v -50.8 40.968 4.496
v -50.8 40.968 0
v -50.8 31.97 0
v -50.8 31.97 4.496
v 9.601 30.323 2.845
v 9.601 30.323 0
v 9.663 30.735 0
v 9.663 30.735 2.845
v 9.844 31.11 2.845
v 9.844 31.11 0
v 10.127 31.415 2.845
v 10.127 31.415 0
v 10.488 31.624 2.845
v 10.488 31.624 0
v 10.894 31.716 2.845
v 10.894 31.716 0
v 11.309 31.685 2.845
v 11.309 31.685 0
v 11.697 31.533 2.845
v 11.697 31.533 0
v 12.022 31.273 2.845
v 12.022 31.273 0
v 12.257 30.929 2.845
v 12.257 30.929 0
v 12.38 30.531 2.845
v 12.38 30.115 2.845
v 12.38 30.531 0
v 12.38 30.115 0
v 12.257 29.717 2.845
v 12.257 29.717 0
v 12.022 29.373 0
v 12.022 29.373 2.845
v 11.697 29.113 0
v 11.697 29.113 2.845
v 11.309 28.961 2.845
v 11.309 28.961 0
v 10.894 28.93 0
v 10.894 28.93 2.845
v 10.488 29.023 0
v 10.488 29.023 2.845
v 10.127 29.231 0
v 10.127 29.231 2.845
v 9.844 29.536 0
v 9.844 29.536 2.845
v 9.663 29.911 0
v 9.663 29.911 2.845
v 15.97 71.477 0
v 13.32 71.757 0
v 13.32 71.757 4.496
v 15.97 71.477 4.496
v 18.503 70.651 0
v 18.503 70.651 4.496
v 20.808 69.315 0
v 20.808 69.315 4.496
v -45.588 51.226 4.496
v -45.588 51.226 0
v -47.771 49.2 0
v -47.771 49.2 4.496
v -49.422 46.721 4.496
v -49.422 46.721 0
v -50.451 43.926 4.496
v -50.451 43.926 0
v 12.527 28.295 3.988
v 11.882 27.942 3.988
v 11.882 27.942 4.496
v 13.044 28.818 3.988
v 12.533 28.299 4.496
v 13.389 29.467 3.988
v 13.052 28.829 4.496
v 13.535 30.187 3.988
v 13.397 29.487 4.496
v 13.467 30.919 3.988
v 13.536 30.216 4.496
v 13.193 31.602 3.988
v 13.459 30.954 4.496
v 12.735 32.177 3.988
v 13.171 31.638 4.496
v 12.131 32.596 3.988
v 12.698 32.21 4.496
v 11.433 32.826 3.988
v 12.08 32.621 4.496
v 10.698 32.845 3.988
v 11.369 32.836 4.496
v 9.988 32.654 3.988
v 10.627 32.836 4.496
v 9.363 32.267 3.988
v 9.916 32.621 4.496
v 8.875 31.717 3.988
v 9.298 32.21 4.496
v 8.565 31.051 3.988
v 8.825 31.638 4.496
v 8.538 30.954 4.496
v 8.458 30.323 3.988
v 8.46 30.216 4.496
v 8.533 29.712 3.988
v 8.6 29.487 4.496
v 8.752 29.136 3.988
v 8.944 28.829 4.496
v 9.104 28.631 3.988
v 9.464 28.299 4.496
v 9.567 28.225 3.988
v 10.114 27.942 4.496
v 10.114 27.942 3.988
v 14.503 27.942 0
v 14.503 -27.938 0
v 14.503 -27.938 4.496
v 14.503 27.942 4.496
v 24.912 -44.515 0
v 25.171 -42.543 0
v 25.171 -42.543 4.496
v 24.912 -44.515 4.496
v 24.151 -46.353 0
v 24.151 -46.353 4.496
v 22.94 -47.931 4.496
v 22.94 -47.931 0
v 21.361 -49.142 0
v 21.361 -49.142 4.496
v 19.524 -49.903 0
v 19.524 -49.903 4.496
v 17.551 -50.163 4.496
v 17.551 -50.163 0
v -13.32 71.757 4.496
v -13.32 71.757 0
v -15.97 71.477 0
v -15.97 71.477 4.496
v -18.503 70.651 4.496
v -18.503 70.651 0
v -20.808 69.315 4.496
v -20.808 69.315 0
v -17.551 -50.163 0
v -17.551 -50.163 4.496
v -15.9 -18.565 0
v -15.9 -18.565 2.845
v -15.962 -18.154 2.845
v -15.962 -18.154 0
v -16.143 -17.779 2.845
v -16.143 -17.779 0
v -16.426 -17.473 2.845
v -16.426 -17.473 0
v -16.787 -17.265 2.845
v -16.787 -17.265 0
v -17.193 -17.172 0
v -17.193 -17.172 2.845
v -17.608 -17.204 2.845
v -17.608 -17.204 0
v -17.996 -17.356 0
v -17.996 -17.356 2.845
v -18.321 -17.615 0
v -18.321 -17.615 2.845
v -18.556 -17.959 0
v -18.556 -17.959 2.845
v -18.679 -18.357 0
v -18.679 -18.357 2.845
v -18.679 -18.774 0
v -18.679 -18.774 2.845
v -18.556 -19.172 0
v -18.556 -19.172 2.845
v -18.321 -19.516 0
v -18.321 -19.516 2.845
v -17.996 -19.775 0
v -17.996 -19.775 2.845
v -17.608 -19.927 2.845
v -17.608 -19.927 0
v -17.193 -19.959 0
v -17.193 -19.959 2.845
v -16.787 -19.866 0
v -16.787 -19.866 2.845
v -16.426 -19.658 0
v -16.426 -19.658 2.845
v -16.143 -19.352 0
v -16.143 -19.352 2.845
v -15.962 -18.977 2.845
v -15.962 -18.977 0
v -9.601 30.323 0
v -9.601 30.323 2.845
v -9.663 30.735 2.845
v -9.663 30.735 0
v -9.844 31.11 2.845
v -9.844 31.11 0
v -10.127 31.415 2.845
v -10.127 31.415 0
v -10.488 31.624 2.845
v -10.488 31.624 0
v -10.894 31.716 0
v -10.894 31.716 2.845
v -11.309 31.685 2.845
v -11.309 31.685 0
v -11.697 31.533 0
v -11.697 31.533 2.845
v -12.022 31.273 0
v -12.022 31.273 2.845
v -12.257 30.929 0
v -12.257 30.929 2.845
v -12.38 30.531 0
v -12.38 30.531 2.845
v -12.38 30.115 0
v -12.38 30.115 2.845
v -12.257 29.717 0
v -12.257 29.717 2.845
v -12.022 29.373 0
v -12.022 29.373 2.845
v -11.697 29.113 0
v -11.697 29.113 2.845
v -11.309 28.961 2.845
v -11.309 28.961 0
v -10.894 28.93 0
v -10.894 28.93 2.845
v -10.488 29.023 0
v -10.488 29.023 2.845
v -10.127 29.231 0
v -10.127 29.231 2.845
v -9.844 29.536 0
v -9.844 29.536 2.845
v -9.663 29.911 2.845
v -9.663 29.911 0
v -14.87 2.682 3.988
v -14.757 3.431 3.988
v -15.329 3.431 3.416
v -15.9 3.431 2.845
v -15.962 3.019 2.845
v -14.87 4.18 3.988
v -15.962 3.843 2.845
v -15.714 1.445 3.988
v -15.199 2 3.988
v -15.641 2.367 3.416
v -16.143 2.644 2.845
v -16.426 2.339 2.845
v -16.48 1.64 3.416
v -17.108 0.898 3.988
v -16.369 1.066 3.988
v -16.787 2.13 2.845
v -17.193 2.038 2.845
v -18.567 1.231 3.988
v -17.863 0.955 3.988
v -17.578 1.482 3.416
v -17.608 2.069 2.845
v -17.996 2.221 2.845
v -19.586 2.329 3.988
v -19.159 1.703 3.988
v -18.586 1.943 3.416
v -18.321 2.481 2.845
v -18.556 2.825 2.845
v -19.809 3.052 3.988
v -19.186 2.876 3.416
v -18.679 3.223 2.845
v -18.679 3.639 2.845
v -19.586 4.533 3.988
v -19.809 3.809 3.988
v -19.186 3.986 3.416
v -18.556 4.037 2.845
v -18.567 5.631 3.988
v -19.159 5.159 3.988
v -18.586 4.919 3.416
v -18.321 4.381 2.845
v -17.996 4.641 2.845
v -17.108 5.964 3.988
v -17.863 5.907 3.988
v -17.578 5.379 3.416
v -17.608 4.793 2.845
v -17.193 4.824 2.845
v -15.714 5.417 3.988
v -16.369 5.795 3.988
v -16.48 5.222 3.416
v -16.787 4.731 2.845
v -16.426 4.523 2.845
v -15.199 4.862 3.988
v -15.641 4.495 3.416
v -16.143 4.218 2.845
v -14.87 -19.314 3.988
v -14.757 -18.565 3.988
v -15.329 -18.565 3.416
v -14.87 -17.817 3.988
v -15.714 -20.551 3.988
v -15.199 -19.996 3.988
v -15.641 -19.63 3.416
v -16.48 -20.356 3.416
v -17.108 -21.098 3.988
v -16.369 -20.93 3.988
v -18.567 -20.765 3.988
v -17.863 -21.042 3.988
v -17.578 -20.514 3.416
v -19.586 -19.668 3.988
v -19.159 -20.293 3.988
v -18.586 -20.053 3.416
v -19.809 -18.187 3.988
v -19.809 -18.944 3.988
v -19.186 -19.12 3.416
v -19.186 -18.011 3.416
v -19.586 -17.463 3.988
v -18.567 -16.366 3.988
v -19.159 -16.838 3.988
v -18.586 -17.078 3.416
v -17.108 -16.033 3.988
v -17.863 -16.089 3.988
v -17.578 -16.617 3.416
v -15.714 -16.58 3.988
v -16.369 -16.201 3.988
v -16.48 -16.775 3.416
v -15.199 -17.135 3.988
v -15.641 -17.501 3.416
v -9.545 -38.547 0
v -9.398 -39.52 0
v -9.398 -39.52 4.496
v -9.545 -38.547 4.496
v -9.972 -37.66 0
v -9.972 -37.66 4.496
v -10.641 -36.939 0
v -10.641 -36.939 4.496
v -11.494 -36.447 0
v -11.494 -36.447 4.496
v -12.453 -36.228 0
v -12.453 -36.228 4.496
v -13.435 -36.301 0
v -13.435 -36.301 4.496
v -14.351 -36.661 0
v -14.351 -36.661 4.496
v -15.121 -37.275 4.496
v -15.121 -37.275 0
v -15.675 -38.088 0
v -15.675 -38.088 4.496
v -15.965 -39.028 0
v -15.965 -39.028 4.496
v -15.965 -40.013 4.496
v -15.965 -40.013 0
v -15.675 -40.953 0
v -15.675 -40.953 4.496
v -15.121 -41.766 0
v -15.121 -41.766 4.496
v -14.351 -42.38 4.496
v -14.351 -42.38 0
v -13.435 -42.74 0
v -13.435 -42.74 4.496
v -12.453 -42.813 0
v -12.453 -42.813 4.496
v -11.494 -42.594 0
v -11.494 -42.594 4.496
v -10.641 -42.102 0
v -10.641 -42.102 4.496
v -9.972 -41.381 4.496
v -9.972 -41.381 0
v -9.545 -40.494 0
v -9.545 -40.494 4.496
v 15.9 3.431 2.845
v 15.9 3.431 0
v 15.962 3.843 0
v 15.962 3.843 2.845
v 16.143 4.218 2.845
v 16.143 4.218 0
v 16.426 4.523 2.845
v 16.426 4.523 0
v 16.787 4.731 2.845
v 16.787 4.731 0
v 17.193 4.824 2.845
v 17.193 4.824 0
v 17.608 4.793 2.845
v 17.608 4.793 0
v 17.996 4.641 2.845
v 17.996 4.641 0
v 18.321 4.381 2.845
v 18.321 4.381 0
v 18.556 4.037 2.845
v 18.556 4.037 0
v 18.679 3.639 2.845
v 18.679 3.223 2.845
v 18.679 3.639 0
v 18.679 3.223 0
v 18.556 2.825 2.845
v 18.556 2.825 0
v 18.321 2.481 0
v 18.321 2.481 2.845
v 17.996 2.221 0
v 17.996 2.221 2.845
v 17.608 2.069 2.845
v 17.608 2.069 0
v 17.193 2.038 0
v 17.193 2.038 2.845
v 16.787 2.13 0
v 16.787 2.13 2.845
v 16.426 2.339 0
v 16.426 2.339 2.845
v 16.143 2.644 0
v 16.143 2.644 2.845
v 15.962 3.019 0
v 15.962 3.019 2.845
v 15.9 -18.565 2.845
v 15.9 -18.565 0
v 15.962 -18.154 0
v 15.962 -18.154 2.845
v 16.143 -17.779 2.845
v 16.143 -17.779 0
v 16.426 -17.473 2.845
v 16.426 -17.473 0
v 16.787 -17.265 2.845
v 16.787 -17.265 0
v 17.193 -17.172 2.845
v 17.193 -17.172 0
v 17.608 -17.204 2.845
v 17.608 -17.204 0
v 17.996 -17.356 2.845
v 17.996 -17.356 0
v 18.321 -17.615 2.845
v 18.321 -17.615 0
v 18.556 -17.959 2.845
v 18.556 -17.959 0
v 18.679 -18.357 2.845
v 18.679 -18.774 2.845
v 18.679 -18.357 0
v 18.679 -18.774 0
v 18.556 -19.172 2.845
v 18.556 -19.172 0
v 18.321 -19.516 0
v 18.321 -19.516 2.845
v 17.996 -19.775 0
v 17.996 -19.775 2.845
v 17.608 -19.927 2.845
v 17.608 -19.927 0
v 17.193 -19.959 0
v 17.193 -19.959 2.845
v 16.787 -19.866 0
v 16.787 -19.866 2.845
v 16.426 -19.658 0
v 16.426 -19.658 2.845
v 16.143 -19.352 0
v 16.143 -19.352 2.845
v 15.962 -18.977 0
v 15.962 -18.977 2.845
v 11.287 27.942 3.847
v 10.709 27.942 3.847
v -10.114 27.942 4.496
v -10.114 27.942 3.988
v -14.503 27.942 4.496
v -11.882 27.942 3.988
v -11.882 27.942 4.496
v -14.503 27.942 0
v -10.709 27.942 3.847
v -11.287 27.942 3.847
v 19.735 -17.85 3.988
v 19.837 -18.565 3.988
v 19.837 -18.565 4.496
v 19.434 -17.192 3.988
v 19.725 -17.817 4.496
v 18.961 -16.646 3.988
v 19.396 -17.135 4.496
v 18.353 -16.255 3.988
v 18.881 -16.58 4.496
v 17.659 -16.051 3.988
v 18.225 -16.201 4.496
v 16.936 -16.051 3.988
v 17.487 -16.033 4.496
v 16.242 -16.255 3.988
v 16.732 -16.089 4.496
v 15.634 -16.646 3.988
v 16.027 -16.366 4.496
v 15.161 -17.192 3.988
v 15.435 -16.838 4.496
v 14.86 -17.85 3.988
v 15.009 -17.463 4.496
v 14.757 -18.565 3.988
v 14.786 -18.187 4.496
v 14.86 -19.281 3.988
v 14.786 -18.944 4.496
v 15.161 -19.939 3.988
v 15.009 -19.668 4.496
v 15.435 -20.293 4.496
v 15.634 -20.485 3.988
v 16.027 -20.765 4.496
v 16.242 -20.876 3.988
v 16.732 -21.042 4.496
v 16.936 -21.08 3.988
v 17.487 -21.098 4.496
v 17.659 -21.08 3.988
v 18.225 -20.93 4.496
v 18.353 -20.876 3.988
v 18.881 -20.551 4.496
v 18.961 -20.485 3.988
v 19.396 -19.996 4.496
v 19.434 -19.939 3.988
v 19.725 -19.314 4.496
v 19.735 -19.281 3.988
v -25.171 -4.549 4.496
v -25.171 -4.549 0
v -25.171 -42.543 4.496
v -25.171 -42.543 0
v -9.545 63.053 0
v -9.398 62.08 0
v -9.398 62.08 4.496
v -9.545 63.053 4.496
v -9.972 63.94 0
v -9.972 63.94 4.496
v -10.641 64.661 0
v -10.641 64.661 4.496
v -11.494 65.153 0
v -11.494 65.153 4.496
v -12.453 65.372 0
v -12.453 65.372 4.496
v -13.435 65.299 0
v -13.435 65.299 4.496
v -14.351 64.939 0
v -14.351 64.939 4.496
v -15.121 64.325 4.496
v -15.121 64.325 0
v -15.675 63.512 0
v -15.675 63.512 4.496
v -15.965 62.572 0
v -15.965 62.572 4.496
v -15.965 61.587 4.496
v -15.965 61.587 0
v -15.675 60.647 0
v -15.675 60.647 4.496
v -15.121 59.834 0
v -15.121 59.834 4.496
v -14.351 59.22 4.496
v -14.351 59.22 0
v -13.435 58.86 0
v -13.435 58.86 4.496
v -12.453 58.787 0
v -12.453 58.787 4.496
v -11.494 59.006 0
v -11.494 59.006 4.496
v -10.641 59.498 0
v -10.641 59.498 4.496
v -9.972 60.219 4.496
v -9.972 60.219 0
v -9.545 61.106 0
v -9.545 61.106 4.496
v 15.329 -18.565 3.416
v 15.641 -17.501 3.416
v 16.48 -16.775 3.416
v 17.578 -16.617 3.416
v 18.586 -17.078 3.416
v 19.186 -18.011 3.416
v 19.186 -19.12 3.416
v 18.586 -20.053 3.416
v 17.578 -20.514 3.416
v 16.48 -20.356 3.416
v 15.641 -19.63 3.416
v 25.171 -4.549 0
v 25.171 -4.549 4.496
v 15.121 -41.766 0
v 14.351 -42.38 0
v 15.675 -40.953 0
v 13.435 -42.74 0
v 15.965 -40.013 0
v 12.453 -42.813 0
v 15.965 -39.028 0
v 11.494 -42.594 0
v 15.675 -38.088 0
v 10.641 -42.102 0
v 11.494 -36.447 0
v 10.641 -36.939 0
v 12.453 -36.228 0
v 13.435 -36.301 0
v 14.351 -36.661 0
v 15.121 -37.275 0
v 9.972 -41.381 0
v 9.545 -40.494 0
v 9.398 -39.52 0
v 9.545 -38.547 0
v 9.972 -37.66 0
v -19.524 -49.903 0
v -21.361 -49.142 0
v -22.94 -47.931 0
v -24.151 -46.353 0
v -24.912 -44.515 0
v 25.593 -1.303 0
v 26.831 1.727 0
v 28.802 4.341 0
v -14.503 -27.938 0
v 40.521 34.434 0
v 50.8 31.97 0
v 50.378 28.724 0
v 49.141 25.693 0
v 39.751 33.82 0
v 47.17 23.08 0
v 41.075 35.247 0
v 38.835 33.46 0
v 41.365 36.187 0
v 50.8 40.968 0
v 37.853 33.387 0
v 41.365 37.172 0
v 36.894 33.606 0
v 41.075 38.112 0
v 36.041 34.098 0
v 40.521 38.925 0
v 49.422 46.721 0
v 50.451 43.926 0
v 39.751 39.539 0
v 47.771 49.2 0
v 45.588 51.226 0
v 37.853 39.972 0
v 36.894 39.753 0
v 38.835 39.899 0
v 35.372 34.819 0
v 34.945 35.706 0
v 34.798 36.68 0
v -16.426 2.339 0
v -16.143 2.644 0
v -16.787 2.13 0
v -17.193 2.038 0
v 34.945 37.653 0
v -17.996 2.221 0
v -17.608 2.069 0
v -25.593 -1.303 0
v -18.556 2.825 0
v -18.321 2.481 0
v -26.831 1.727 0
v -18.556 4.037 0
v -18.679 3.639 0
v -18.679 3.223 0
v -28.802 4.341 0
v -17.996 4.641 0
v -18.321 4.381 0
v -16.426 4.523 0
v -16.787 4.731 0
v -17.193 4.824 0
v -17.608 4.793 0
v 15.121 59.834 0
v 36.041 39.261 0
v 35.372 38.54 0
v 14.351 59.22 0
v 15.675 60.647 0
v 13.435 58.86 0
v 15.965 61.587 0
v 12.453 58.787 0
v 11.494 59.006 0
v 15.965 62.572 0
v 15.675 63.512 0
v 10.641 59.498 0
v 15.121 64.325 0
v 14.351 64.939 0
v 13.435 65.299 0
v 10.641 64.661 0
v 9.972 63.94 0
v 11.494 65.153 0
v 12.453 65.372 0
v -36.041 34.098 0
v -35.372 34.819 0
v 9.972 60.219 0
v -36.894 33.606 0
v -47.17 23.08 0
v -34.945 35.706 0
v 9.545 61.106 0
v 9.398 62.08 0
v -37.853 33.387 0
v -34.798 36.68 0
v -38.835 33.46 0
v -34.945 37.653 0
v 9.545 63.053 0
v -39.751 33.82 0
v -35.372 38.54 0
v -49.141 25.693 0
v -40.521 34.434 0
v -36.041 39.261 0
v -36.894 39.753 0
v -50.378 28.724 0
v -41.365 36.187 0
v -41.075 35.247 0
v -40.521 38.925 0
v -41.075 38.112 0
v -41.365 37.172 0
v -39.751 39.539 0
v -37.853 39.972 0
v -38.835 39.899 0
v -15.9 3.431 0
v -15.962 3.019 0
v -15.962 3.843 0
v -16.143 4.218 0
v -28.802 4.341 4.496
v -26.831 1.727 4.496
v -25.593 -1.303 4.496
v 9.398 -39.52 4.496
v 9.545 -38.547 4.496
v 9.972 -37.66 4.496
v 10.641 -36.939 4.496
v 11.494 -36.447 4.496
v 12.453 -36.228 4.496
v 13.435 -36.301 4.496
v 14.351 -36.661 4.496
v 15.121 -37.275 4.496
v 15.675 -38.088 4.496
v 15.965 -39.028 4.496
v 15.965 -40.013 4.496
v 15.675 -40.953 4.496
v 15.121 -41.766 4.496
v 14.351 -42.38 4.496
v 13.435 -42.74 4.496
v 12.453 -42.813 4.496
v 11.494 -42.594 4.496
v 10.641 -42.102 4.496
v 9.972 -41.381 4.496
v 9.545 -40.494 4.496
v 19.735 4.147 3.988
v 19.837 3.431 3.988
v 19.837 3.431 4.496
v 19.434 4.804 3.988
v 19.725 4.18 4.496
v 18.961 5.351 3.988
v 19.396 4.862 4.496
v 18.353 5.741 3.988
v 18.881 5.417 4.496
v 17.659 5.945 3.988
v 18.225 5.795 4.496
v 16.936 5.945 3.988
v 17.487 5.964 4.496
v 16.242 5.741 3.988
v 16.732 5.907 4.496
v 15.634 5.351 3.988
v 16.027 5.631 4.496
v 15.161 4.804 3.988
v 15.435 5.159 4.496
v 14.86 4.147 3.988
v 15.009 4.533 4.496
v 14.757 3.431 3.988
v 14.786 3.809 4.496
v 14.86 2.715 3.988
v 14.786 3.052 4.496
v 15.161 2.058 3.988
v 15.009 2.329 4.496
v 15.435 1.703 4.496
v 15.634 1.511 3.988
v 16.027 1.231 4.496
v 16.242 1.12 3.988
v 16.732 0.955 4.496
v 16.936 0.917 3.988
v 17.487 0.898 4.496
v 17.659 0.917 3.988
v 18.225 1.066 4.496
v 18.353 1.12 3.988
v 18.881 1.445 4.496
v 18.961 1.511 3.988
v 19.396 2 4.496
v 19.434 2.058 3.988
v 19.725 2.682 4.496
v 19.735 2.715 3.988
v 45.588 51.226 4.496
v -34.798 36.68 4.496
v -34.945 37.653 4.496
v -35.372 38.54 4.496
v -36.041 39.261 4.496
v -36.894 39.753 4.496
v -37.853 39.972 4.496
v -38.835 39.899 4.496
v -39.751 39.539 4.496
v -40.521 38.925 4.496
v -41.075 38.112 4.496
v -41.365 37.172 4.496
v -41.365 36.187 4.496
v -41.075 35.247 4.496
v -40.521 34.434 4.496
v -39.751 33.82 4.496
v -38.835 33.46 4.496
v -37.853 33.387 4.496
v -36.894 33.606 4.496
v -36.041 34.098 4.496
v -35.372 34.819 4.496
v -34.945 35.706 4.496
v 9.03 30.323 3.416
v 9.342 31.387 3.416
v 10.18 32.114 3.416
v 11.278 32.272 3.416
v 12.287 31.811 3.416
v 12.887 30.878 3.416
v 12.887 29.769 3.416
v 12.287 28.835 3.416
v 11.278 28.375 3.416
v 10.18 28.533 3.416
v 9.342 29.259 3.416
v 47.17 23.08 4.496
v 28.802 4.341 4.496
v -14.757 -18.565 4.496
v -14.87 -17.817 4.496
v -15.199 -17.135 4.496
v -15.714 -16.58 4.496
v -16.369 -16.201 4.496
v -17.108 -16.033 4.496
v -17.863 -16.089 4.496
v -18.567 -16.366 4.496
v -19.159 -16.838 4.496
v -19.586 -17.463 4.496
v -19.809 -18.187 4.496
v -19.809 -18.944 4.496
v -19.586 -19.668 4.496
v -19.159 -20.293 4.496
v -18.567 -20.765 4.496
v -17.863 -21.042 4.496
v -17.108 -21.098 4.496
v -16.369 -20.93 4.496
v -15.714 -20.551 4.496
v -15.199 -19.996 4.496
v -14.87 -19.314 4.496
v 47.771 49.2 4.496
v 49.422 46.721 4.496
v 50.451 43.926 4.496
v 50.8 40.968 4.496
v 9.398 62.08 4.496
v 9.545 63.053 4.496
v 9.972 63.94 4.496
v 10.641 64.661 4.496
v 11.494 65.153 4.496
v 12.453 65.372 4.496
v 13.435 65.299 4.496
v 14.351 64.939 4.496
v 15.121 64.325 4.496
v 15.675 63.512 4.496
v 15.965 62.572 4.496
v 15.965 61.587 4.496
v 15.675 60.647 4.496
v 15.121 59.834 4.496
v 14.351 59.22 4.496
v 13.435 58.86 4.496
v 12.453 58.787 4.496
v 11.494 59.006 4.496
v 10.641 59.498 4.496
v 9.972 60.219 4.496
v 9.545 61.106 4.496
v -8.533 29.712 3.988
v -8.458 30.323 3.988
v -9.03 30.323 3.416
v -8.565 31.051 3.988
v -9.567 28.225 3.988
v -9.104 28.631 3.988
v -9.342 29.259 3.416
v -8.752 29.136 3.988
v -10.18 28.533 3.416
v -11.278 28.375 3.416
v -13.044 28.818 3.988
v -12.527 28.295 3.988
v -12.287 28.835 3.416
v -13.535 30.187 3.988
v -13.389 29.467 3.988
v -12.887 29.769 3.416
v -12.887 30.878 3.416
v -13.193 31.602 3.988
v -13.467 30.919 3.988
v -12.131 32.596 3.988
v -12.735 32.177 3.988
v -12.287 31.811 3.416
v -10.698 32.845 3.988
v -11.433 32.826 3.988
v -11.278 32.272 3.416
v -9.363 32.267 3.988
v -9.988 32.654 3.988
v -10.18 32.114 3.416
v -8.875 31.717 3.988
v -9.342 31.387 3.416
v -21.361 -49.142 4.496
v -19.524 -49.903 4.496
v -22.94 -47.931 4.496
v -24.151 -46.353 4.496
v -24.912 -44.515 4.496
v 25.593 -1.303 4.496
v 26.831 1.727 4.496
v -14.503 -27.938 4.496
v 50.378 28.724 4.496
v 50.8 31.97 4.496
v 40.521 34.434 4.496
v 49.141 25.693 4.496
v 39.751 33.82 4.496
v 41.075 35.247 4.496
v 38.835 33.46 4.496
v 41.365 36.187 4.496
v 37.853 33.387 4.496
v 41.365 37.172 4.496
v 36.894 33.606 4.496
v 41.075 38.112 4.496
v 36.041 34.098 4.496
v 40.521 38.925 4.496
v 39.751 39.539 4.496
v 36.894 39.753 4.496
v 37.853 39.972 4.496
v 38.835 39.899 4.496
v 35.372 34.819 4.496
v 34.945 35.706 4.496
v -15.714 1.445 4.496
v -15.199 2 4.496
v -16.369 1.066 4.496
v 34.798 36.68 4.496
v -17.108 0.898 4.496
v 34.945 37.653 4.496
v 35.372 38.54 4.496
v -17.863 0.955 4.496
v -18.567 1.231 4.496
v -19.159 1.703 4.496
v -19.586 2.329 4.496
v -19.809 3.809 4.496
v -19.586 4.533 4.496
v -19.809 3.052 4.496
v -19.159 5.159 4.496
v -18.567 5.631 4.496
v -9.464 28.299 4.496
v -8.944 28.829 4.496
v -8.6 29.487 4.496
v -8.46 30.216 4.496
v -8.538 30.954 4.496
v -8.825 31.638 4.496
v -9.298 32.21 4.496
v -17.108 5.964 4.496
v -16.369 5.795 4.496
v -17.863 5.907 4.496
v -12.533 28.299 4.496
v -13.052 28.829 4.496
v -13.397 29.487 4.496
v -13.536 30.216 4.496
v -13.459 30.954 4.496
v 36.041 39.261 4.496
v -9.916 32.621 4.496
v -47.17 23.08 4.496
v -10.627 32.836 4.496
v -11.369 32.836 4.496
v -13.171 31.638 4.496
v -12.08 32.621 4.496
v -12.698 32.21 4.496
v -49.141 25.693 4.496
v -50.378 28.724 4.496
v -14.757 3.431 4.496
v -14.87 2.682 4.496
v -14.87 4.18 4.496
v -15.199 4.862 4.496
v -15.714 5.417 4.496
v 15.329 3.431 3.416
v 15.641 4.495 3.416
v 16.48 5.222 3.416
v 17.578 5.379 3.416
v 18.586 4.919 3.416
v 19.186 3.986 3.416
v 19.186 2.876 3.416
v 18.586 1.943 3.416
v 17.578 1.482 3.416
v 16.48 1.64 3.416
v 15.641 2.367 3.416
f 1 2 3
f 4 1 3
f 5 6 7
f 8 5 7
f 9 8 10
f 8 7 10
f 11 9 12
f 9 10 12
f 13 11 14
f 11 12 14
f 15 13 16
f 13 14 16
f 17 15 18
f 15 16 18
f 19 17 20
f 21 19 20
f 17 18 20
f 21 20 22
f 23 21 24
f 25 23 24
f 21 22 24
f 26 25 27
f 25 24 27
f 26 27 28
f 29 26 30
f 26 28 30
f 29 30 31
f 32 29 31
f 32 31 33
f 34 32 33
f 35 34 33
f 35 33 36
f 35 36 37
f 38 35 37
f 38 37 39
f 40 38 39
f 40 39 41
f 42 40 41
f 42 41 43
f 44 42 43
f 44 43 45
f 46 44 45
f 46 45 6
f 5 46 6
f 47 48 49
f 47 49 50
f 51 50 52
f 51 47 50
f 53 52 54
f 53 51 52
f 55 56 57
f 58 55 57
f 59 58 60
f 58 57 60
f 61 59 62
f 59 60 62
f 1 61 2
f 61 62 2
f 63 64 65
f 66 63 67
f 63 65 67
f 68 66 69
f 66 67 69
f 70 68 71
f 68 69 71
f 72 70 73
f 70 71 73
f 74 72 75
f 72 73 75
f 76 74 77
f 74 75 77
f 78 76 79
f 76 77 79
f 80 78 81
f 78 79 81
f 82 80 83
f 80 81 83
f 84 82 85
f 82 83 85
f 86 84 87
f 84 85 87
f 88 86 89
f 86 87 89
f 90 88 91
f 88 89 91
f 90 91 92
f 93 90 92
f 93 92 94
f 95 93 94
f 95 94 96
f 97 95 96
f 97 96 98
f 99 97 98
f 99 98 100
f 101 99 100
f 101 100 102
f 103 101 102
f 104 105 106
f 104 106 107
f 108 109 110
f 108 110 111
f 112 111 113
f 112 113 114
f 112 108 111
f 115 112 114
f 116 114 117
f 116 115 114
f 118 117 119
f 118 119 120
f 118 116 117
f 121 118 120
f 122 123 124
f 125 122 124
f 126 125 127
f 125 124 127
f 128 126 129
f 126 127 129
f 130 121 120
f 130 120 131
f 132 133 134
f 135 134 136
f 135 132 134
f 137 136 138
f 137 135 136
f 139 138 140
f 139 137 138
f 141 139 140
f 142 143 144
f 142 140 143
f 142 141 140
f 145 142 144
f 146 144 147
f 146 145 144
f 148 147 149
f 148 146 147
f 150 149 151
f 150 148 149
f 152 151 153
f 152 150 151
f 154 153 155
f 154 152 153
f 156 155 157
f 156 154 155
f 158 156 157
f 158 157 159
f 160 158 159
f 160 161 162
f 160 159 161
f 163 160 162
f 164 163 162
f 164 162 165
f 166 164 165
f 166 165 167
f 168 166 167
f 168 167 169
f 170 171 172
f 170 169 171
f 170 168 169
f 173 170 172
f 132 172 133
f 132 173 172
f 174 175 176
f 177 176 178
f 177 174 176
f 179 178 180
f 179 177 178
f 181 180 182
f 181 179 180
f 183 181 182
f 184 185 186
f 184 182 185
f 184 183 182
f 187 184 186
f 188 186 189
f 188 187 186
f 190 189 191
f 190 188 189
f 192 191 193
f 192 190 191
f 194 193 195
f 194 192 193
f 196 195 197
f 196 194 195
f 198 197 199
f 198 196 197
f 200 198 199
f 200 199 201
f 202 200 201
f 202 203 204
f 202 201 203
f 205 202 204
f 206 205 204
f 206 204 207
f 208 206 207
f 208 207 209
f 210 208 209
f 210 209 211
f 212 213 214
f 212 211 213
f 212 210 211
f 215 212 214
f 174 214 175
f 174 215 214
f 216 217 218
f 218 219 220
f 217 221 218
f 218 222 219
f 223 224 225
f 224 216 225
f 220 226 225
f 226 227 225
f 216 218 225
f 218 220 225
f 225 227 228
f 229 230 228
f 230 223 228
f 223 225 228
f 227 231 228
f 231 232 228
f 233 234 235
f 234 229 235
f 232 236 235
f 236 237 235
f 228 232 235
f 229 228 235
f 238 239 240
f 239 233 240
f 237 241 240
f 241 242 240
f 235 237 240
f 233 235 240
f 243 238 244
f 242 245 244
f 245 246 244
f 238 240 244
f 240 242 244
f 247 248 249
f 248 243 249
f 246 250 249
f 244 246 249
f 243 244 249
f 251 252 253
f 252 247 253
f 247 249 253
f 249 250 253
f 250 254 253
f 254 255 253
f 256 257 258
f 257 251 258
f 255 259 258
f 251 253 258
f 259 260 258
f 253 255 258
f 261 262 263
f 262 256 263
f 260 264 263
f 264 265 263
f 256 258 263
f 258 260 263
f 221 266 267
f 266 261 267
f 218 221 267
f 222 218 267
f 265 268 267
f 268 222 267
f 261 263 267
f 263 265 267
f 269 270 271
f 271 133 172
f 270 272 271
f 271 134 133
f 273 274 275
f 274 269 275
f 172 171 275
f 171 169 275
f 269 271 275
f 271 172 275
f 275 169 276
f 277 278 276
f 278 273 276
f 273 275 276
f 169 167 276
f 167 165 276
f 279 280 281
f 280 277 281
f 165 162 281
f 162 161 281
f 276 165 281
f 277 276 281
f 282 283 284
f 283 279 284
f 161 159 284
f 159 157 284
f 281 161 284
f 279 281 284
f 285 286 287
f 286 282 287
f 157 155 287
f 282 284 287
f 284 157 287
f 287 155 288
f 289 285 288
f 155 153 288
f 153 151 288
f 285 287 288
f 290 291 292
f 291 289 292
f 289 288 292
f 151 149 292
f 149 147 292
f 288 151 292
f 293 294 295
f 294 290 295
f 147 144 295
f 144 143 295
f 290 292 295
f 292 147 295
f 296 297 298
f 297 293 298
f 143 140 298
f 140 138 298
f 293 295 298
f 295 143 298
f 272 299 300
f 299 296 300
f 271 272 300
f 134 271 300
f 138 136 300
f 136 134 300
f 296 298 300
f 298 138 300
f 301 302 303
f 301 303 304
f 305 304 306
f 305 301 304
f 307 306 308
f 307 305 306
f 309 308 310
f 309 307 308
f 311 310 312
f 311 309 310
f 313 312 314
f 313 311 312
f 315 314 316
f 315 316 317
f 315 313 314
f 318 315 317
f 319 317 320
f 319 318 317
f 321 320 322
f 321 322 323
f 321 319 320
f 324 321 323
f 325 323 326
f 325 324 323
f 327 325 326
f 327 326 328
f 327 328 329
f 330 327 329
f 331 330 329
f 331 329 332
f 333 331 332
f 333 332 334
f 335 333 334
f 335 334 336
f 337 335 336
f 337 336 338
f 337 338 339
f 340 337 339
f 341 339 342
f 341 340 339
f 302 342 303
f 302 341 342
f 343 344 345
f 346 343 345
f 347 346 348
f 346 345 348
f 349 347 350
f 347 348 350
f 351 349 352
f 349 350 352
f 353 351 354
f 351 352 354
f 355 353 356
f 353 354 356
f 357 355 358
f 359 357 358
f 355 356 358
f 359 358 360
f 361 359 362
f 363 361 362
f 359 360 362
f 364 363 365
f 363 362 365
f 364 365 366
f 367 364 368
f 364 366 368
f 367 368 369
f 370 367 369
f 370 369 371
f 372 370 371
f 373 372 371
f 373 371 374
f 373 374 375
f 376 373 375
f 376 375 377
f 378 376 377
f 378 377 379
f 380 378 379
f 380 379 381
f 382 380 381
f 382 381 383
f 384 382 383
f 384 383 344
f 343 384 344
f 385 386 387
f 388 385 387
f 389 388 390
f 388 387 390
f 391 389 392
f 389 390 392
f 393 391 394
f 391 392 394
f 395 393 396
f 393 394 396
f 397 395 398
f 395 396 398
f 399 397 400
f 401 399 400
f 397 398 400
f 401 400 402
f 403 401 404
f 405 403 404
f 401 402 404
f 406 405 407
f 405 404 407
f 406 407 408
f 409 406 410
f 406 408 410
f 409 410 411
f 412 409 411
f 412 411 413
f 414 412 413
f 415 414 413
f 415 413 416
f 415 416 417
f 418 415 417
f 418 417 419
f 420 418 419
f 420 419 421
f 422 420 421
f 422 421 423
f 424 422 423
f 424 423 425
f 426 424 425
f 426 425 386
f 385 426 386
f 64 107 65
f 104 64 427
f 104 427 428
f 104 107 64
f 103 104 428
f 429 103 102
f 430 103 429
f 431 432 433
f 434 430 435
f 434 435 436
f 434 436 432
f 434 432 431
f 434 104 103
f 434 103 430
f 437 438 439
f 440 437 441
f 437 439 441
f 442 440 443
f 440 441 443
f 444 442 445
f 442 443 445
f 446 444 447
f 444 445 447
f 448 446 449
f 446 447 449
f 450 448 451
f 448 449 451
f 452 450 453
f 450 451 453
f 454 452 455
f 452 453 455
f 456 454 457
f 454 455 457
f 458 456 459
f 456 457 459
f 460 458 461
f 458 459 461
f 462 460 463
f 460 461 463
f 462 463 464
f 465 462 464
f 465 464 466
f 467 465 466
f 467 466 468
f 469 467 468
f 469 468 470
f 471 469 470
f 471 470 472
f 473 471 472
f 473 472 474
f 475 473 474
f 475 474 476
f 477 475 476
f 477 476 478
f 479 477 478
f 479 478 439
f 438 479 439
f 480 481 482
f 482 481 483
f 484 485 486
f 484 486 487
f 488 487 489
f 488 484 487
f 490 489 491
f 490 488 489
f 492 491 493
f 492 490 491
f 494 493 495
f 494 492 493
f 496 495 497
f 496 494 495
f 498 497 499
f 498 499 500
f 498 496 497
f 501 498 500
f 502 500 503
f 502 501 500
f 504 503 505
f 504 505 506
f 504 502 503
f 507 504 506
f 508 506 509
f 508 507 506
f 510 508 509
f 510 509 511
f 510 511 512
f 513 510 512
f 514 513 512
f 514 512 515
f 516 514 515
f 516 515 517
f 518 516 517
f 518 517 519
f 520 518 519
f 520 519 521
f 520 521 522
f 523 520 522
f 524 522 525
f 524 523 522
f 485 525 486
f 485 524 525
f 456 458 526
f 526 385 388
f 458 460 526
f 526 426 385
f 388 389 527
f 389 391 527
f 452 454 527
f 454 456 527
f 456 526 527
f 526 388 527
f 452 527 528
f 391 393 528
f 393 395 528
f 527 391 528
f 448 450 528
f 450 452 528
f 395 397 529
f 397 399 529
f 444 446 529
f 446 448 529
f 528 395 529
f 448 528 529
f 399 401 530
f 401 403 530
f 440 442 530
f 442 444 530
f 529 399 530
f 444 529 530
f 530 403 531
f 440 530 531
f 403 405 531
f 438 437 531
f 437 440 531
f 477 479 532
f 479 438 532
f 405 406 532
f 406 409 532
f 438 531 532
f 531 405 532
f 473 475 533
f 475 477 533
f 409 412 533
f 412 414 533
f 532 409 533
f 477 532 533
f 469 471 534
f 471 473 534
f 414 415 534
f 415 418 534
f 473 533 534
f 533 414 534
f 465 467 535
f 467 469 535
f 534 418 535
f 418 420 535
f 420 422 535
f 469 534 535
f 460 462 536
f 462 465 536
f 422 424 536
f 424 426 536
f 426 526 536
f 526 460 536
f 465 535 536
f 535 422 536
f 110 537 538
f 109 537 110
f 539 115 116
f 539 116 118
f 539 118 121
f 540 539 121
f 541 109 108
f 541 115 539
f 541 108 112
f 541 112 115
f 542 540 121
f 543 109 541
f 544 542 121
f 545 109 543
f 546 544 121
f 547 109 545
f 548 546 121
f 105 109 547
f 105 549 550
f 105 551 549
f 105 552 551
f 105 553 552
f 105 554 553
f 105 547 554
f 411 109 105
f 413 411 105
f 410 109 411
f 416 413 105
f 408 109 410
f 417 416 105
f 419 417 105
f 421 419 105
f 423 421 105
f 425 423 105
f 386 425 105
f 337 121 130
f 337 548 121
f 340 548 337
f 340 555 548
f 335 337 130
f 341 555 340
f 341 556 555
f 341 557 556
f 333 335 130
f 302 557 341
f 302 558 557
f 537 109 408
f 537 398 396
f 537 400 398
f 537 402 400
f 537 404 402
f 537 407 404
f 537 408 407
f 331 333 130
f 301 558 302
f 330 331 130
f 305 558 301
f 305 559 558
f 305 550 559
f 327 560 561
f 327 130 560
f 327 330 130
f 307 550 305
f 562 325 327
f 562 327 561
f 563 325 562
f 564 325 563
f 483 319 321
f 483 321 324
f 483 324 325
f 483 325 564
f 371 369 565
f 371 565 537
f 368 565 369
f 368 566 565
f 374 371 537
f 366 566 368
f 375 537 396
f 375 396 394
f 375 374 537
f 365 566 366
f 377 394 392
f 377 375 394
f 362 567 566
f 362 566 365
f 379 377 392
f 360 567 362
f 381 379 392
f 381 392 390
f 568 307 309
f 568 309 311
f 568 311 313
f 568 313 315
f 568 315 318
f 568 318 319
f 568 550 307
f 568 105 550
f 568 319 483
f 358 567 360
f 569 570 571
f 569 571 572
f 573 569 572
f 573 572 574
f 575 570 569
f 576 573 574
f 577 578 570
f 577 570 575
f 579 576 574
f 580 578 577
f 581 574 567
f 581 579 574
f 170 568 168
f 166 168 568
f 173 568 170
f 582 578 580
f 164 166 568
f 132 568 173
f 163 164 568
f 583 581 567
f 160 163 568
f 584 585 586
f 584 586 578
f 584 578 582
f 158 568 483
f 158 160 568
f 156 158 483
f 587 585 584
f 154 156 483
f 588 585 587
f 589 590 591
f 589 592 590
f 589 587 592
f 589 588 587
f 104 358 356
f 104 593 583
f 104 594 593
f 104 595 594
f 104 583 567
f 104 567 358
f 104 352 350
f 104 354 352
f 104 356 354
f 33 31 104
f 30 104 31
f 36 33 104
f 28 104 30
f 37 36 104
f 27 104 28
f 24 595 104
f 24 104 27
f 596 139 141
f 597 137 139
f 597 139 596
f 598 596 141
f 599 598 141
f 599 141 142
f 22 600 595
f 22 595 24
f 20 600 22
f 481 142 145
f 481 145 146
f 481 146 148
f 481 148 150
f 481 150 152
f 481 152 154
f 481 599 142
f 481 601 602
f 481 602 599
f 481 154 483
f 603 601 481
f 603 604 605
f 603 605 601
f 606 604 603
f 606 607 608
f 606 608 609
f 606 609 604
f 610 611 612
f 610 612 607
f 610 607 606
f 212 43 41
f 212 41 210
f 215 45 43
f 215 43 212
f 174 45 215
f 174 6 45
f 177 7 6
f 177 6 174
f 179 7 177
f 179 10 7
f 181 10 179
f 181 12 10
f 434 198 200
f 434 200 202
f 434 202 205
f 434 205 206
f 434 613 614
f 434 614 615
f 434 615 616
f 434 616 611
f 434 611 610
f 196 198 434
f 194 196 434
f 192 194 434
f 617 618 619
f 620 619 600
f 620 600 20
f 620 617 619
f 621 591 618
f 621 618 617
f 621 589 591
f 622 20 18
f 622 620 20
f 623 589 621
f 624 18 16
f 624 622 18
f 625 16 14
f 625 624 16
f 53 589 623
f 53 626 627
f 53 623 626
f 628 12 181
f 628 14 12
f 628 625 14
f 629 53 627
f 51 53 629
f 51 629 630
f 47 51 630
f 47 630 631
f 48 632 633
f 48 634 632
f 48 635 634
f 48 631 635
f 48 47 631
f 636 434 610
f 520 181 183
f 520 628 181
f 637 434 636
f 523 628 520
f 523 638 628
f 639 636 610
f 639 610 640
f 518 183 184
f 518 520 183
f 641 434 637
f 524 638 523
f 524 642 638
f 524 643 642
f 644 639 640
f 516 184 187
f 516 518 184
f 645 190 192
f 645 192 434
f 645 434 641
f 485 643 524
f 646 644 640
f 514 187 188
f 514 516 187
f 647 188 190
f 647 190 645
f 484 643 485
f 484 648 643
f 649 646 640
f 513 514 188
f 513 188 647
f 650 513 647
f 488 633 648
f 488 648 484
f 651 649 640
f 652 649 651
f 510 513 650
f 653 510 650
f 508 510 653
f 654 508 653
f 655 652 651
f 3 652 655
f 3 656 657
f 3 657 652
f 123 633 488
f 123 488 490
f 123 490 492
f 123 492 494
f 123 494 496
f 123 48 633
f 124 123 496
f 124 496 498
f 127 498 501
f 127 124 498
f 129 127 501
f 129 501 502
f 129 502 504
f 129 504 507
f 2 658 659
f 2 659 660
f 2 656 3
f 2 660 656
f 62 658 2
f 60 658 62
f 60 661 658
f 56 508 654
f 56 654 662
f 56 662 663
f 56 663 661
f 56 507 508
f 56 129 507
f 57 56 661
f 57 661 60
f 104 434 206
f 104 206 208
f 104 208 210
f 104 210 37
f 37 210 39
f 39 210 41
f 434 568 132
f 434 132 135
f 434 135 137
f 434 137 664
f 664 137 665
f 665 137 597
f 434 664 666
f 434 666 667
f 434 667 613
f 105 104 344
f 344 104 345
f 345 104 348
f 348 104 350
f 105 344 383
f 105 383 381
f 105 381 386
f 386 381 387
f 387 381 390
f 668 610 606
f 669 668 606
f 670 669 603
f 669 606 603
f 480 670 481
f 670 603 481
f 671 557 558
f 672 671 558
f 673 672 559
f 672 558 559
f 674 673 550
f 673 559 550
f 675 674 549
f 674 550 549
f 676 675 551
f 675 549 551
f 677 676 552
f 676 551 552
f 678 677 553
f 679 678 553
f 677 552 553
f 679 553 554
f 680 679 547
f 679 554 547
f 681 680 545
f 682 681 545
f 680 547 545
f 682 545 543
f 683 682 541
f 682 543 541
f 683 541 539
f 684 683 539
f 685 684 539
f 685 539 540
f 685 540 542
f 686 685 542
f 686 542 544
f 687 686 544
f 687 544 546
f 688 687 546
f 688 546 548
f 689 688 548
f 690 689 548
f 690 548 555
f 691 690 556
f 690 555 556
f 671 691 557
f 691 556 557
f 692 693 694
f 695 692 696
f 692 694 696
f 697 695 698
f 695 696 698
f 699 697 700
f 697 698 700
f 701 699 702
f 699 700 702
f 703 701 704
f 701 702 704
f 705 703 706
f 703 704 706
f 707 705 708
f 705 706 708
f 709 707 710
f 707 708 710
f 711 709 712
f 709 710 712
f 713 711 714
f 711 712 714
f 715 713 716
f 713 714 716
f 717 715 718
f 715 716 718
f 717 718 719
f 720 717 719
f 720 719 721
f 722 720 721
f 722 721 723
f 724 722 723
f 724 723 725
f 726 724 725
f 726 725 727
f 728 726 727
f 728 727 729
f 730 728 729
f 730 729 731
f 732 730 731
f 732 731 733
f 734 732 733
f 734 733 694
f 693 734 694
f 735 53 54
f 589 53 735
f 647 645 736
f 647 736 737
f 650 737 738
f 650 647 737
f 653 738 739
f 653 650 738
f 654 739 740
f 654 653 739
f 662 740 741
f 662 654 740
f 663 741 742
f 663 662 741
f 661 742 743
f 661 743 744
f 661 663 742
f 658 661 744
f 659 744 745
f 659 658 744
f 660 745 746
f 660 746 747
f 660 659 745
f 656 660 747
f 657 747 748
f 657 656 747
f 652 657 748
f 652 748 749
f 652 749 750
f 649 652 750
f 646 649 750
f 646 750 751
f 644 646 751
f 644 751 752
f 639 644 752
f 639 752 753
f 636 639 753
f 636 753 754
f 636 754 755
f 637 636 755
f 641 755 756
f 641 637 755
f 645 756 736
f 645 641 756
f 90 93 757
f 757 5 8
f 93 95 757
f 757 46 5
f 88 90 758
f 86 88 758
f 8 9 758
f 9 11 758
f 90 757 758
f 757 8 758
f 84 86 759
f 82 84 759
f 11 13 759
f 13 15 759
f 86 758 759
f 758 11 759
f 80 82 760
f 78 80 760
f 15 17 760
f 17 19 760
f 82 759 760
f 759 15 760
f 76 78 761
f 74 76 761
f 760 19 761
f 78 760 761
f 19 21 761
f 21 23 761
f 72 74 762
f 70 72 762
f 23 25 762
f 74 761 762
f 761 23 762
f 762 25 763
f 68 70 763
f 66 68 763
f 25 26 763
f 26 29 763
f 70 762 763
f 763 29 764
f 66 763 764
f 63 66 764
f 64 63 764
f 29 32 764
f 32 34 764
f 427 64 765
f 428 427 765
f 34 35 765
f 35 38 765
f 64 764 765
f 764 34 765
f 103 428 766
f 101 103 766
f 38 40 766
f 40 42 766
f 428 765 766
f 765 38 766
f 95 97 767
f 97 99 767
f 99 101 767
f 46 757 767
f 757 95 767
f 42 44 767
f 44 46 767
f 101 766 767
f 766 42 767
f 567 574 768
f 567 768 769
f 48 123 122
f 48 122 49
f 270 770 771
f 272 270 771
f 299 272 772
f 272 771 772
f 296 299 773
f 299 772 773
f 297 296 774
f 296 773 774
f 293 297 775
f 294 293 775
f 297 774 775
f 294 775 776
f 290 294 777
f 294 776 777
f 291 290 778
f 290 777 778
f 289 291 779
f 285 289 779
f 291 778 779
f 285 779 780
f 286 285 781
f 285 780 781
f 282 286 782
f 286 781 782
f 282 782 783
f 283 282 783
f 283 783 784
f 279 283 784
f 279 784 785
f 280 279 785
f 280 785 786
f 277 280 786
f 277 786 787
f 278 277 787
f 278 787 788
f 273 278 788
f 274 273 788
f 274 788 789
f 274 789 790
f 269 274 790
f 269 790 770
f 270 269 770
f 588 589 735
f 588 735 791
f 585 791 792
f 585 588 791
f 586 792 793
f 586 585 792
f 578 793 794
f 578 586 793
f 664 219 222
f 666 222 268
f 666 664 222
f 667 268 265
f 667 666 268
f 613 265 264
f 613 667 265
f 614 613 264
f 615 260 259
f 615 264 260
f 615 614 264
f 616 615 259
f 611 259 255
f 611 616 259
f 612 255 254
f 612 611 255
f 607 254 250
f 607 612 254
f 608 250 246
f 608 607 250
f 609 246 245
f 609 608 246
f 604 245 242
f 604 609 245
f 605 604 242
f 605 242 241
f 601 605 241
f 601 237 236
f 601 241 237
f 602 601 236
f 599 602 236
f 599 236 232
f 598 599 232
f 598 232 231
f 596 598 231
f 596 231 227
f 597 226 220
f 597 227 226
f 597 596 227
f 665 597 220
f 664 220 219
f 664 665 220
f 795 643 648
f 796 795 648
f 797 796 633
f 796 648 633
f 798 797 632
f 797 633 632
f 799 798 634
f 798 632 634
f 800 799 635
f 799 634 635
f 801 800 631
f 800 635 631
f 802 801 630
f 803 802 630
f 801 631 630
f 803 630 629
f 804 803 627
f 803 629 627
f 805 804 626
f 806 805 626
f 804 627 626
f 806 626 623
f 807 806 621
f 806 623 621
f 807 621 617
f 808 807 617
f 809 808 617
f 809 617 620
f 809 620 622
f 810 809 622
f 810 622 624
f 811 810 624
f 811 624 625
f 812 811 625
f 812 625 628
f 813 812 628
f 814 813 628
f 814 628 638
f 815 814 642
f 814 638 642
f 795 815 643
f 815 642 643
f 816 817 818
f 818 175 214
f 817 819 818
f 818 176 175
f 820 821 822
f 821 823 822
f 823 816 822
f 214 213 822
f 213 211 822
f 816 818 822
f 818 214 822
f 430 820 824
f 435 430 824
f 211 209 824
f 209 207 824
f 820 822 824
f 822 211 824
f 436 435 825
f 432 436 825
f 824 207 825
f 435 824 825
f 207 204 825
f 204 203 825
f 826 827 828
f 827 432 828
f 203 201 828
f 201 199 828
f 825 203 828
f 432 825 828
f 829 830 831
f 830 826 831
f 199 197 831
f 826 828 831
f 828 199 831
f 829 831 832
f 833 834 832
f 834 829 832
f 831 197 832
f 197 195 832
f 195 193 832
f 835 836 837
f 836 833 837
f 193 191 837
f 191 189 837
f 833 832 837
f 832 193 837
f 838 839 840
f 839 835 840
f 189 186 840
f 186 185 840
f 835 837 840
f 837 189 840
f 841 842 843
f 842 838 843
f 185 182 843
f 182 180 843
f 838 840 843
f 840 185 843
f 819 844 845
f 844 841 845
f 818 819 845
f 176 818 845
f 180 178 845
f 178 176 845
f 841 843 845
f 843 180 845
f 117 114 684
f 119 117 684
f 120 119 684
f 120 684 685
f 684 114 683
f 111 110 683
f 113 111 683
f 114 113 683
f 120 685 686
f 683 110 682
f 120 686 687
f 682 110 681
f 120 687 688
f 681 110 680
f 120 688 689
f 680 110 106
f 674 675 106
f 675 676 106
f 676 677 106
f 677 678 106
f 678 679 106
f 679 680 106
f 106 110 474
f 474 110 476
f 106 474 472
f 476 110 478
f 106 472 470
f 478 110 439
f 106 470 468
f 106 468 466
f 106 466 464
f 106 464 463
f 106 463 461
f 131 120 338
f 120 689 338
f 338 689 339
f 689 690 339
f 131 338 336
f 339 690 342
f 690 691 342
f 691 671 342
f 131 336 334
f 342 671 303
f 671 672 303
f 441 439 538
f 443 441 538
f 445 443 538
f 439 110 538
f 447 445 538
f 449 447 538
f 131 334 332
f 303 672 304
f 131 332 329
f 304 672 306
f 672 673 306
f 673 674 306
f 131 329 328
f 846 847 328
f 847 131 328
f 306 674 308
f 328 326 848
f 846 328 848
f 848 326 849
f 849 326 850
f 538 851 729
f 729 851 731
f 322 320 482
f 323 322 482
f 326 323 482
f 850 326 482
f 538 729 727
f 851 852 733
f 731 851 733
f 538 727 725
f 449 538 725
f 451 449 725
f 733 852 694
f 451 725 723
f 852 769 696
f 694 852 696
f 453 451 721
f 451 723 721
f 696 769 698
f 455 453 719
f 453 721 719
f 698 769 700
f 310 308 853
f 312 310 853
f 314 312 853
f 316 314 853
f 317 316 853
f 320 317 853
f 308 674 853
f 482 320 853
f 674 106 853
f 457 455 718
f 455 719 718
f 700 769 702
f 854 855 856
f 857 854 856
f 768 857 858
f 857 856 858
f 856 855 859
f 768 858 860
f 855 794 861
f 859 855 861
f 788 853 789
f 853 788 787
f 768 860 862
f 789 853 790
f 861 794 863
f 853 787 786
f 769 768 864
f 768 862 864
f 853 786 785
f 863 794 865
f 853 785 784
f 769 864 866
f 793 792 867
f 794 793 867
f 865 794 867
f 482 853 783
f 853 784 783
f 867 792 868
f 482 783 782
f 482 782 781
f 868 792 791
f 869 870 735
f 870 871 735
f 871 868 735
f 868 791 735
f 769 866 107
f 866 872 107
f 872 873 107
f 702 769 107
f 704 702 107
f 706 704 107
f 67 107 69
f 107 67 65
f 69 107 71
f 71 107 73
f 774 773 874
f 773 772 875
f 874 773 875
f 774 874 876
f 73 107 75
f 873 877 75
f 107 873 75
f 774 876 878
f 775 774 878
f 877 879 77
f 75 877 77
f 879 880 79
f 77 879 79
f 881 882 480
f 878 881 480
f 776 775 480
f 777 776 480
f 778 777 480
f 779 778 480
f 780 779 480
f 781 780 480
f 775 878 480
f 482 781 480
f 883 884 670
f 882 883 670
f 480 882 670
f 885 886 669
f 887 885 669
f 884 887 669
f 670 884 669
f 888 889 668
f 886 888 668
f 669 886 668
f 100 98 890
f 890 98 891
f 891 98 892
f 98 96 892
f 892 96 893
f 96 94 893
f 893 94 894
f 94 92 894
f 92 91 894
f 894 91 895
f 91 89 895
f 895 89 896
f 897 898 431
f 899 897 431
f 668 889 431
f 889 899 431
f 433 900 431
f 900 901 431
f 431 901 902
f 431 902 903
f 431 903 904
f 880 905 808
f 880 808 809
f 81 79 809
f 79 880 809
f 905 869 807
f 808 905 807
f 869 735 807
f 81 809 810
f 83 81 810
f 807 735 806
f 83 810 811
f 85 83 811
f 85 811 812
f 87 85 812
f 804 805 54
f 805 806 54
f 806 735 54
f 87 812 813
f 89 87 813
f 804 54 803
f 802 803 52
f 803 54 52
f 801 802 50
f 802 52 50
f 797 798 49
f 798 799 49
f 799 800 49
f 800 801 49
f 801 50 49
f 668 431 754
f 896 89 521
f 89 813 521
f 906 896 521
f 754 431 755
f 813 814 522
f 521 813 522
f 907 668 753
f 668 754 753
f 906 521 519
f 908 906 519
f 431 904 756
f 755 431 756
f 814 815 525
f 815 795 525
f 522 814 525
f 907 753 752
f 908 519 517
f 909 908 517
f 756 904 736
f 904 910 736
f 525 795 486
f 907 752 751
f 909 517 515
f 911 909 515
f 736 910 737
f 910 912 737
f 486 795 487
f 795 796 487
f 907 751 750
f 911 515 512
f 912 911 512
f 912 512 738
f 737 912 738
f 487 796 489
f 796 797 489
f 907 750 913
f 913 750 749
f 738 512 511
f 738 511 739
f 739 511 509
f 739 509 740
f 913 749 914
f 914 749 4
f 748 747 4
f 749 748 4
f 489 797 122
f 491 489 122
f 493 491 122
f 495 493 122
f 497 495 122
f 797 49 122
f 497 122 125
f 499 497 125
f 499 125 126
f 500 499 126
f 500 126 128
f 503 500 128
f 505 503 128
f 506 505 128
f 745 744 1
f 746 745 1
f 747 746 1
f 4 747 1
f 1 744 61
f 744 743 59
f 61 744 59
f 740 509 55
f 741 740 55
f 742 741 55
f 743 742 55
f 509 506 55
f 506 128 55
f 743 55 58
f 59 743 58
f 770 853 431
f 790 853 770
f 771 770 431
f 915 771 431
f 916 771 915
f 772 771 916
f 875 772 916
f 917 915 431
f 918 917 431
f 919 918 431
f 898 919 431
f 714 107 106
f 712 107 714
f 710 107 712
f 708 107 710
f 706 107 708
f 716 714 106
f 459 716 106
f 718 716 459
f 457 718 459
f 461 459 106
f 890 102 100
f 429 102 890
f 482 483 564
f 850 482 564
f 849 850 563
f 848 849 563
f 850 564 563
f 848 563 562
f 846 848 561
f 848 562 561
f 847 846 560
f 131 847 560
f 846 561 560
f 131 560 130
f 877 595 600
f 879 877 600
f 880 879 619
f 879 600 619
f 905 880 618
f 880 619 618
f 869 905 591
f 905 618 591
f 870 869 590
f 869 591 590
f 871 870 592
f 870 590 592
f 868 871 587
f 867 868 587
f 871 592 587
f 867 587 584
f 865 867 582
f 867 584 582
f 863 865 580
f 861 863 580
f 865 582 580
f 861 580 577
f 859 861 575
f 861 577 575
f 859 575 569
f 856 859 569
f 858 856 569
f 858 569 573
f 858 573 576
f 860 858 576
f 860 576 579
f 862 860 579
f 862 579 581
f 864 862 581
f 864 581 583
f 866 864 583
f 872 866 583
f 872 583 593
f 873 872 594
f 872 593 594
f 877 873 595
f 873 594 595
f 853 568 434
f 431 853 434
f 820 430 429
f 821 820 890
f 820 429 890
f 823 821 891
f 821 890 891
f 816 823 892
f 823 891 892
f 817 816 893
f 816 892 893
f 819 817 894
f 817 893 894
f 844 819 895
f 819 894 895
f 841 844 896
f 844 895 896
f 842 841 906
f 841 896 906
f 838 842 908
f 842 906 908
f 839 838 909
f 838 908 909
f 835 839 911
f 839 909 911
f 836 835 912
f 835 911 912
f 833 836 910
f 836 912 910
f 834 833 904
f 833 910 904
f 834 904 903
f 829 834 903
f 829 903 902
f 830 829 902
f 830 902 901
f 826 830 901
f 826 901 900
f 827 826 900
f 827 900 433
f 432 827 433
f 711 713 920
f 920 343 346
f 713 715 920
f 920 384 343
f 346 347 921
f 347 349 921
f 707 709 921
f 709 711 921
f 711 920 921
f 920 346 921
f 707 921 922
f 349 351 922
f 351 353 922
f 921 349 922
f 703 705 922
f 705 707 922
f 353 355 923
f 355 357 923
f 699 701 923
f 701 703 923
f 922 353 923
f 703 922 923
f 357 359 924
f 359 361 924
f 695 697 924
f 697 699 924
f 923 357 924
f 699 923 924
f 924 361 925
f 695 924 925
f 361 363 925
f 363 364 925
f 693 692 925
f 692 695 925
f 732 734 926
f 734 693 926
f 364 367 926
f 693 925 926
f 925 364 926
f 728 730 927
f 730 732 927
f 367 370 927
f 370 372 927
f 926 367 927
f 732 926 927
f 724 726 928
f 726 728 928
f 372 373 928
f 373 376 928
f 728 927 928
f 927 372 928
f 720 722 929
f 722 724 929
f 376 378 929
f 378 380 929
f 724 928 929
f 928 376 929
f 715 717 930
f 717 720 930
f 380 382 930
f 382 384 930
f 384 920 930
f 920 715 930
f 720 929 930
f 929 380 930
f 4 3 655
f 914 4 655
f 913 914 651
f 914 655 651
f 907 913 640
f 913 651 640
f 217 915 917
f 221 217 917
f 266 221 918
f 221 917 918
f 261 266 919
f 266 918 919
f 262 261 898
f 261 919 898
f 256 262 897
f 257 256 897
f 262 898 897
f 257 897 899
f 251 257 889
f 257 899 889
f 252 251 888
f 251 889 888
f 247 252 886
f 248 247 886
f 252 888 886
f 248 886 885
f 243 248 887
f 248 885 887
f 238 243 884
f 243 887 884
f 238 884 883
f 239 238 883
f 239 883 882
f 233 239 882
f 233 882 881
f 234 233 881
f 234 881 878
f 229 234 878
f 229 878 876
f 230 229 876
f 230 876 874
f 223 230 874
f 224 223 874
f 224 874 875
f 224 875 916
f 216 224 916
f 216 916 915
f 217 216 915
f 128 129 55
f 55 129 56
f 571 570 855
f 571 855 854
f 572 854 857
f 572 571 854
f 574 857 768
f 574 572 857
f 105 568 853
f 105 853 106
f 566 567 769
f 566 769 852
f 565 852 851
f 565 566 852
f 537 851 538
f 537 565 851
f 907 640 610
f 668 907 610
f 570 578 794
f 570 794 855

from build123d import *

# Parameters (mm, degrees)
F0_R         = 3.302
F0_R_2       = 1.397
F1_DEPTH     = 4.4958
F3_R         = 2.54
F4_DEPTH     = 0.381
F5_S5_R      = 2.54
F5_T6_DEPTH  = 5
F5_S11_R     = 2.54
F5_T12_DEPTH = 5
F5_S17_R     = 2.54
F5_T18_DEPTH = 5
F5_S23_R     = 2.54
F5_T24_DEPTH = 5
F5_S29_R     = 2.54
F5_T30_DEPTH = 5
F5_S35_R     = 2.54
F5_T36_DEPTH = 5


# Not quite as in the source:
# - a fillet or chamfer that OpenCascade refuses, or shapes differently, is made with other operations: its cross-section is extruded or revolved along the edge and cut away or added


with BuildPart() as f1:
    # F0 (on Top) → F1 (new body)
    with BuildSketch(Plane.XY):
        with BuildLine():
            Line((0, 71.7569190334), (-13.3202167361, 71.7569190334))
            ThreePointArc((-13.3202167361, 71.7569190334), (-17.2583195593, 71.1309136563), (-20.8081903285, 69.3146113411))
            Line((-20.8081903285, 69.3146113411), (-45.5879735924, 51.2257120897))
            ThreePointArc((-45.5879735924, 51.2257120897), (-49.4222626852, 46.7209640446), (-50.8, 40.968019782))
            Line((-50.8, 40.968019782), (-50.8, 31.9697443563))
            ThreePointArc((-50.8, 31.9697443563), (-49.8574337411, 27.1684162251), (-47.1696453822, 23.0797762663))
            Line((-47.1696453822, 23.0797762663), (-28.8017546178, 4.3406476252))
            ThreePointArc((-28.8017546178, 4.3406476252), (-26.1139662589, 0.2520076664), (-25.1714, -4.5493204647))
            Line((-25.1714, -4.5493204647), (-25.1714, -42.5430809666))
            ThreePointArc((-25.1714, -42.5430809666), (-22.9395536726, -47.9312346392), (-17.5514, -50.1630809666))
            Line((-17.5514, -50.1630809666), (0, -50.1630809666))
            Line((0, -50.1630809666), (0, -27.9380809666))
            Line((0, -27.9380809666), (-14.5034, -27.9380809666))
            Line((-14.5034, -27.9380809666), (-14.5034, 27.9419190334))
            Line((-14.5034, 27.9419190334), (0, 27.9419190334))
            Line((0, 27.9419190334), (0, 71.7569190334))
        make_face()
        with Locations((-12.7, -39.5204809666)):
            Circle(F0_R, mode=Mode.SUBTRACT)
        with Locations((-17.2974, -18.5654809666)):
            Circle(F0_R_2, mode=Mode.SUBTRACT)
        with Locations((-17.2974, 3.4309190334)):
            Circle(F0_R_2, mode=Mode.SUBTRACT)
        with Locations((-38.1, 36.6795190334)):
            Circle(F0_R, mode=Mode.SUBTRACT)
        with Locations((-10.9982, 30.3231690334)):
            Circle(F0_R_2, mode=Mode.SUBTRACT)
        with Locations((-12.7, 62.0795190334)):
            Circle(F0_R, mode=Mode.SUBTRACT)
    extrude(amount=F1_DEPTH)

    # F2: F1 across face


with BuildPart() as f1_1:
    add(f1.part)
    add(f1.part.mirror(Plane(origin=(0, 49.8494190334, 2.2479), x_dir=(0, 1, 0), z_dir=(1, 0, 0))))

    # F3 (on face) → F4 (cut)
    with BuildSketch(Plane.XY.offset(4.4958)):
        with Locations((-10.9982, 30.3231690334)):
            Circle(F3_R)
        with Locations((-17.2974, 3.4309190334)):
            Circle(F3_R)
        with Locations((-17.2974, -18.5654809666)):
            Circle(F3_R)
        with Locations((10.9982, 30.3231690334)):
            Circle(F3_R)
        with Locations((17.2974, 3.4309190334)):
            Circle(F3_R)
        with Locations((17.2974, -18.5654809666)):
            Circle(F3_R)
    extrude(amount=-F4_DEPTH, mode=Mode.SUBTRACT)

    # F5: chamfer of 1.27 on 6 edges, made by hand


with BuildPart() as f5_tool2:
    # F5_s3 → F5_t4 (revolve)
    with BuildSketch(Plane.XZ.offset(-30.3231690334)):
        Polygon((-8.3312, 4.1148), (-9.6012, 2.8448), (-9.6012, 4.1148), align=None)
    revolve(axis=Axis((-10.9982, 30.3231690334, 4.1148), (0, 0, -1)))

    # F5_s5 → F5_t6 (intersect, symmetric)
    with BuildSketch(Plane.XY.offset(3.5)):
        with Locations((-10.9982, 30.3231690334)):
            Circle(F5_S5_R)
    extrude(amount=F5_T6_DEPTH, both=True, mode=Mode.INTERSECT)


with BuildPart() as f1_2:
    add(f1_1.part)

    # F5_t1: cut F5_tool2
    add(f5_tool2.part, mode=Mode.SUBTRACT)


with BuildPart() as f5_tool8:
    # F5_s9 → F5_t10 (revolve)
    with BuildSketch(Plane.XZ.offset(-30.3231690334)):
        Polygon((8.3312, 4.1148), (9.6012, 2.8448), (9.6012, 4.1148), align=None)
    revolve(axis=Axis((10.9982, 30.3231690334, 4.1148), (0, 0, -1)))

    # F5_s11 → F5_t12 (intersect, symmetric)
    with BuildSketch(Plane.XY.offset(3.5)):
        with Locations((10.9982, 30.3231690334)):
            Circle(F5_S11_R)
    extrude(amount=F5_T12_DEPTH, both=True, mode=Mode.INTERSECT)


with BuildPart() as f1_3:
    add(f1_2.part)

    # F5_t7: cut F5_tool8
    add(f5_tool8.part, mode=Mode.SUBTRACT)


with BuildPart() as f5_tool14:
    # F5_s15 → F5_t16 (revolve)
    with BuildSketch(Plane.XZ.offset(-3.4309190334)):
        Polygon((-14.6304, 4.1148), (-15.9004, 2.8448), (-15.9004, 4.1148), align=None)
    revolve(axis=Axis((-17.2974, 3.4309190334, 4.1148), (0, 0, -1)))

    # F5_s17 → F5_t18 (intersect, symmetric)
    with BuildSketch(Plane.XY.offset(3.5)):
        with Locations((-17.2974, 3.4309190334)):
            Circle(F5_S17_R)
    extrude(amount=F5_T18_DEPTH, both=True, mode=Mode.INTERSECT)


with BuildPart() as f1_4:
    add(f1_3.part)

    # F5_t13: cut F5_tool14
    add(f5_tool14.part, mode=Mode.SUBTRACT)


with BuildPart() as f5_tool20:
    # F5_s21 → F5_t22 (revolve)
    with BuildSketch(Plane.XZ.offset(-3.4309190334)):
        Polygon((14.6304, 4.1148), (15.9004, 2.8448), (15.9004, 4.1148), align=None)
    revolve(axis=Axis((17.2974, 3.4309190334, 4.1148), (0, 0, -1)))

    # F5_s23 → F5_t24 (intersect, symmetric)
    with BuildSketch(Plane.XY.offset(3.5)):
        with Locations((17.2974, 3.4309190334)):
            Circle(F5_S23_R)
    extrude(amount=F5_T24_DEPTH, both=True, mode=Mode.INTERSECT)


with BuildPart() as f1_5:
    add(f1_4.part)

    # F5_t19: cut F5_tool20
    add(f5_tool20.part, mode=Mode.SUBTRACT)


with BuildPart() as f5_tool26:
    # F5_s27 → F5_t28 (revolve)
    with BuildSketch(Plane.XZ.offset(18.5654809666)):
        Polygon((-14.6304, 4.1148), (-15.9004, 2.8448), (-15.9004, 4.1148), align=None)
    revolve(axis=Axis((-17.2974, -18.5654809666, 4.1148), (0, 0, -1)))

    # F5_s29 → F5_t30 (intersect, symmetric)
    with BuildSketch(Plane.XY.offset(3.5)):
        with Locations((-17.2974, -18.5654809666)):
            Circle(F5_S29_R)
    extrude(amount=F5_T30_DEPTH, both=True, mode=Mode.INTERSECT)


with BuildPart() as f1_6:
    add(f1_5.part)

    # F5_t25: cut F5_tool26
    add(f5_tool26.part, mode=Mode.SUBTRACT)


with BuildPart() as f5_tool32:
    # F5_s33 → F5_t34 (revolve)
    with BuildSketch(Plane.XZ.offset(18.5654809666)):
        Polygon((14.6304, 4.1148), (15.9004, 2.8448), (15.9004, 4.1148), align=None)
    revolve(axis=Axis((17.2974, -18.5654809666, 4.1148), (0, 0, -1)))

    # F5_s35 → F5_t36 (intersect, symmetric)
    with BuildSketch(Plane.XY.offset(3.5)):
        with Locations((17.2974, -18.5654809666)):
            Circle(F5_S35_R)
    extrude(amount=F5_T36_DEPTH, both=True, mode=Mode.INTERSECT)


with BuildPart() as f1_7:
    add(f1_6.part)

    # F5_t31: cut F5_tool32
    add(f5_tool32.part, mode=Mode.SUBTRACT)


solid = f1_7.part
